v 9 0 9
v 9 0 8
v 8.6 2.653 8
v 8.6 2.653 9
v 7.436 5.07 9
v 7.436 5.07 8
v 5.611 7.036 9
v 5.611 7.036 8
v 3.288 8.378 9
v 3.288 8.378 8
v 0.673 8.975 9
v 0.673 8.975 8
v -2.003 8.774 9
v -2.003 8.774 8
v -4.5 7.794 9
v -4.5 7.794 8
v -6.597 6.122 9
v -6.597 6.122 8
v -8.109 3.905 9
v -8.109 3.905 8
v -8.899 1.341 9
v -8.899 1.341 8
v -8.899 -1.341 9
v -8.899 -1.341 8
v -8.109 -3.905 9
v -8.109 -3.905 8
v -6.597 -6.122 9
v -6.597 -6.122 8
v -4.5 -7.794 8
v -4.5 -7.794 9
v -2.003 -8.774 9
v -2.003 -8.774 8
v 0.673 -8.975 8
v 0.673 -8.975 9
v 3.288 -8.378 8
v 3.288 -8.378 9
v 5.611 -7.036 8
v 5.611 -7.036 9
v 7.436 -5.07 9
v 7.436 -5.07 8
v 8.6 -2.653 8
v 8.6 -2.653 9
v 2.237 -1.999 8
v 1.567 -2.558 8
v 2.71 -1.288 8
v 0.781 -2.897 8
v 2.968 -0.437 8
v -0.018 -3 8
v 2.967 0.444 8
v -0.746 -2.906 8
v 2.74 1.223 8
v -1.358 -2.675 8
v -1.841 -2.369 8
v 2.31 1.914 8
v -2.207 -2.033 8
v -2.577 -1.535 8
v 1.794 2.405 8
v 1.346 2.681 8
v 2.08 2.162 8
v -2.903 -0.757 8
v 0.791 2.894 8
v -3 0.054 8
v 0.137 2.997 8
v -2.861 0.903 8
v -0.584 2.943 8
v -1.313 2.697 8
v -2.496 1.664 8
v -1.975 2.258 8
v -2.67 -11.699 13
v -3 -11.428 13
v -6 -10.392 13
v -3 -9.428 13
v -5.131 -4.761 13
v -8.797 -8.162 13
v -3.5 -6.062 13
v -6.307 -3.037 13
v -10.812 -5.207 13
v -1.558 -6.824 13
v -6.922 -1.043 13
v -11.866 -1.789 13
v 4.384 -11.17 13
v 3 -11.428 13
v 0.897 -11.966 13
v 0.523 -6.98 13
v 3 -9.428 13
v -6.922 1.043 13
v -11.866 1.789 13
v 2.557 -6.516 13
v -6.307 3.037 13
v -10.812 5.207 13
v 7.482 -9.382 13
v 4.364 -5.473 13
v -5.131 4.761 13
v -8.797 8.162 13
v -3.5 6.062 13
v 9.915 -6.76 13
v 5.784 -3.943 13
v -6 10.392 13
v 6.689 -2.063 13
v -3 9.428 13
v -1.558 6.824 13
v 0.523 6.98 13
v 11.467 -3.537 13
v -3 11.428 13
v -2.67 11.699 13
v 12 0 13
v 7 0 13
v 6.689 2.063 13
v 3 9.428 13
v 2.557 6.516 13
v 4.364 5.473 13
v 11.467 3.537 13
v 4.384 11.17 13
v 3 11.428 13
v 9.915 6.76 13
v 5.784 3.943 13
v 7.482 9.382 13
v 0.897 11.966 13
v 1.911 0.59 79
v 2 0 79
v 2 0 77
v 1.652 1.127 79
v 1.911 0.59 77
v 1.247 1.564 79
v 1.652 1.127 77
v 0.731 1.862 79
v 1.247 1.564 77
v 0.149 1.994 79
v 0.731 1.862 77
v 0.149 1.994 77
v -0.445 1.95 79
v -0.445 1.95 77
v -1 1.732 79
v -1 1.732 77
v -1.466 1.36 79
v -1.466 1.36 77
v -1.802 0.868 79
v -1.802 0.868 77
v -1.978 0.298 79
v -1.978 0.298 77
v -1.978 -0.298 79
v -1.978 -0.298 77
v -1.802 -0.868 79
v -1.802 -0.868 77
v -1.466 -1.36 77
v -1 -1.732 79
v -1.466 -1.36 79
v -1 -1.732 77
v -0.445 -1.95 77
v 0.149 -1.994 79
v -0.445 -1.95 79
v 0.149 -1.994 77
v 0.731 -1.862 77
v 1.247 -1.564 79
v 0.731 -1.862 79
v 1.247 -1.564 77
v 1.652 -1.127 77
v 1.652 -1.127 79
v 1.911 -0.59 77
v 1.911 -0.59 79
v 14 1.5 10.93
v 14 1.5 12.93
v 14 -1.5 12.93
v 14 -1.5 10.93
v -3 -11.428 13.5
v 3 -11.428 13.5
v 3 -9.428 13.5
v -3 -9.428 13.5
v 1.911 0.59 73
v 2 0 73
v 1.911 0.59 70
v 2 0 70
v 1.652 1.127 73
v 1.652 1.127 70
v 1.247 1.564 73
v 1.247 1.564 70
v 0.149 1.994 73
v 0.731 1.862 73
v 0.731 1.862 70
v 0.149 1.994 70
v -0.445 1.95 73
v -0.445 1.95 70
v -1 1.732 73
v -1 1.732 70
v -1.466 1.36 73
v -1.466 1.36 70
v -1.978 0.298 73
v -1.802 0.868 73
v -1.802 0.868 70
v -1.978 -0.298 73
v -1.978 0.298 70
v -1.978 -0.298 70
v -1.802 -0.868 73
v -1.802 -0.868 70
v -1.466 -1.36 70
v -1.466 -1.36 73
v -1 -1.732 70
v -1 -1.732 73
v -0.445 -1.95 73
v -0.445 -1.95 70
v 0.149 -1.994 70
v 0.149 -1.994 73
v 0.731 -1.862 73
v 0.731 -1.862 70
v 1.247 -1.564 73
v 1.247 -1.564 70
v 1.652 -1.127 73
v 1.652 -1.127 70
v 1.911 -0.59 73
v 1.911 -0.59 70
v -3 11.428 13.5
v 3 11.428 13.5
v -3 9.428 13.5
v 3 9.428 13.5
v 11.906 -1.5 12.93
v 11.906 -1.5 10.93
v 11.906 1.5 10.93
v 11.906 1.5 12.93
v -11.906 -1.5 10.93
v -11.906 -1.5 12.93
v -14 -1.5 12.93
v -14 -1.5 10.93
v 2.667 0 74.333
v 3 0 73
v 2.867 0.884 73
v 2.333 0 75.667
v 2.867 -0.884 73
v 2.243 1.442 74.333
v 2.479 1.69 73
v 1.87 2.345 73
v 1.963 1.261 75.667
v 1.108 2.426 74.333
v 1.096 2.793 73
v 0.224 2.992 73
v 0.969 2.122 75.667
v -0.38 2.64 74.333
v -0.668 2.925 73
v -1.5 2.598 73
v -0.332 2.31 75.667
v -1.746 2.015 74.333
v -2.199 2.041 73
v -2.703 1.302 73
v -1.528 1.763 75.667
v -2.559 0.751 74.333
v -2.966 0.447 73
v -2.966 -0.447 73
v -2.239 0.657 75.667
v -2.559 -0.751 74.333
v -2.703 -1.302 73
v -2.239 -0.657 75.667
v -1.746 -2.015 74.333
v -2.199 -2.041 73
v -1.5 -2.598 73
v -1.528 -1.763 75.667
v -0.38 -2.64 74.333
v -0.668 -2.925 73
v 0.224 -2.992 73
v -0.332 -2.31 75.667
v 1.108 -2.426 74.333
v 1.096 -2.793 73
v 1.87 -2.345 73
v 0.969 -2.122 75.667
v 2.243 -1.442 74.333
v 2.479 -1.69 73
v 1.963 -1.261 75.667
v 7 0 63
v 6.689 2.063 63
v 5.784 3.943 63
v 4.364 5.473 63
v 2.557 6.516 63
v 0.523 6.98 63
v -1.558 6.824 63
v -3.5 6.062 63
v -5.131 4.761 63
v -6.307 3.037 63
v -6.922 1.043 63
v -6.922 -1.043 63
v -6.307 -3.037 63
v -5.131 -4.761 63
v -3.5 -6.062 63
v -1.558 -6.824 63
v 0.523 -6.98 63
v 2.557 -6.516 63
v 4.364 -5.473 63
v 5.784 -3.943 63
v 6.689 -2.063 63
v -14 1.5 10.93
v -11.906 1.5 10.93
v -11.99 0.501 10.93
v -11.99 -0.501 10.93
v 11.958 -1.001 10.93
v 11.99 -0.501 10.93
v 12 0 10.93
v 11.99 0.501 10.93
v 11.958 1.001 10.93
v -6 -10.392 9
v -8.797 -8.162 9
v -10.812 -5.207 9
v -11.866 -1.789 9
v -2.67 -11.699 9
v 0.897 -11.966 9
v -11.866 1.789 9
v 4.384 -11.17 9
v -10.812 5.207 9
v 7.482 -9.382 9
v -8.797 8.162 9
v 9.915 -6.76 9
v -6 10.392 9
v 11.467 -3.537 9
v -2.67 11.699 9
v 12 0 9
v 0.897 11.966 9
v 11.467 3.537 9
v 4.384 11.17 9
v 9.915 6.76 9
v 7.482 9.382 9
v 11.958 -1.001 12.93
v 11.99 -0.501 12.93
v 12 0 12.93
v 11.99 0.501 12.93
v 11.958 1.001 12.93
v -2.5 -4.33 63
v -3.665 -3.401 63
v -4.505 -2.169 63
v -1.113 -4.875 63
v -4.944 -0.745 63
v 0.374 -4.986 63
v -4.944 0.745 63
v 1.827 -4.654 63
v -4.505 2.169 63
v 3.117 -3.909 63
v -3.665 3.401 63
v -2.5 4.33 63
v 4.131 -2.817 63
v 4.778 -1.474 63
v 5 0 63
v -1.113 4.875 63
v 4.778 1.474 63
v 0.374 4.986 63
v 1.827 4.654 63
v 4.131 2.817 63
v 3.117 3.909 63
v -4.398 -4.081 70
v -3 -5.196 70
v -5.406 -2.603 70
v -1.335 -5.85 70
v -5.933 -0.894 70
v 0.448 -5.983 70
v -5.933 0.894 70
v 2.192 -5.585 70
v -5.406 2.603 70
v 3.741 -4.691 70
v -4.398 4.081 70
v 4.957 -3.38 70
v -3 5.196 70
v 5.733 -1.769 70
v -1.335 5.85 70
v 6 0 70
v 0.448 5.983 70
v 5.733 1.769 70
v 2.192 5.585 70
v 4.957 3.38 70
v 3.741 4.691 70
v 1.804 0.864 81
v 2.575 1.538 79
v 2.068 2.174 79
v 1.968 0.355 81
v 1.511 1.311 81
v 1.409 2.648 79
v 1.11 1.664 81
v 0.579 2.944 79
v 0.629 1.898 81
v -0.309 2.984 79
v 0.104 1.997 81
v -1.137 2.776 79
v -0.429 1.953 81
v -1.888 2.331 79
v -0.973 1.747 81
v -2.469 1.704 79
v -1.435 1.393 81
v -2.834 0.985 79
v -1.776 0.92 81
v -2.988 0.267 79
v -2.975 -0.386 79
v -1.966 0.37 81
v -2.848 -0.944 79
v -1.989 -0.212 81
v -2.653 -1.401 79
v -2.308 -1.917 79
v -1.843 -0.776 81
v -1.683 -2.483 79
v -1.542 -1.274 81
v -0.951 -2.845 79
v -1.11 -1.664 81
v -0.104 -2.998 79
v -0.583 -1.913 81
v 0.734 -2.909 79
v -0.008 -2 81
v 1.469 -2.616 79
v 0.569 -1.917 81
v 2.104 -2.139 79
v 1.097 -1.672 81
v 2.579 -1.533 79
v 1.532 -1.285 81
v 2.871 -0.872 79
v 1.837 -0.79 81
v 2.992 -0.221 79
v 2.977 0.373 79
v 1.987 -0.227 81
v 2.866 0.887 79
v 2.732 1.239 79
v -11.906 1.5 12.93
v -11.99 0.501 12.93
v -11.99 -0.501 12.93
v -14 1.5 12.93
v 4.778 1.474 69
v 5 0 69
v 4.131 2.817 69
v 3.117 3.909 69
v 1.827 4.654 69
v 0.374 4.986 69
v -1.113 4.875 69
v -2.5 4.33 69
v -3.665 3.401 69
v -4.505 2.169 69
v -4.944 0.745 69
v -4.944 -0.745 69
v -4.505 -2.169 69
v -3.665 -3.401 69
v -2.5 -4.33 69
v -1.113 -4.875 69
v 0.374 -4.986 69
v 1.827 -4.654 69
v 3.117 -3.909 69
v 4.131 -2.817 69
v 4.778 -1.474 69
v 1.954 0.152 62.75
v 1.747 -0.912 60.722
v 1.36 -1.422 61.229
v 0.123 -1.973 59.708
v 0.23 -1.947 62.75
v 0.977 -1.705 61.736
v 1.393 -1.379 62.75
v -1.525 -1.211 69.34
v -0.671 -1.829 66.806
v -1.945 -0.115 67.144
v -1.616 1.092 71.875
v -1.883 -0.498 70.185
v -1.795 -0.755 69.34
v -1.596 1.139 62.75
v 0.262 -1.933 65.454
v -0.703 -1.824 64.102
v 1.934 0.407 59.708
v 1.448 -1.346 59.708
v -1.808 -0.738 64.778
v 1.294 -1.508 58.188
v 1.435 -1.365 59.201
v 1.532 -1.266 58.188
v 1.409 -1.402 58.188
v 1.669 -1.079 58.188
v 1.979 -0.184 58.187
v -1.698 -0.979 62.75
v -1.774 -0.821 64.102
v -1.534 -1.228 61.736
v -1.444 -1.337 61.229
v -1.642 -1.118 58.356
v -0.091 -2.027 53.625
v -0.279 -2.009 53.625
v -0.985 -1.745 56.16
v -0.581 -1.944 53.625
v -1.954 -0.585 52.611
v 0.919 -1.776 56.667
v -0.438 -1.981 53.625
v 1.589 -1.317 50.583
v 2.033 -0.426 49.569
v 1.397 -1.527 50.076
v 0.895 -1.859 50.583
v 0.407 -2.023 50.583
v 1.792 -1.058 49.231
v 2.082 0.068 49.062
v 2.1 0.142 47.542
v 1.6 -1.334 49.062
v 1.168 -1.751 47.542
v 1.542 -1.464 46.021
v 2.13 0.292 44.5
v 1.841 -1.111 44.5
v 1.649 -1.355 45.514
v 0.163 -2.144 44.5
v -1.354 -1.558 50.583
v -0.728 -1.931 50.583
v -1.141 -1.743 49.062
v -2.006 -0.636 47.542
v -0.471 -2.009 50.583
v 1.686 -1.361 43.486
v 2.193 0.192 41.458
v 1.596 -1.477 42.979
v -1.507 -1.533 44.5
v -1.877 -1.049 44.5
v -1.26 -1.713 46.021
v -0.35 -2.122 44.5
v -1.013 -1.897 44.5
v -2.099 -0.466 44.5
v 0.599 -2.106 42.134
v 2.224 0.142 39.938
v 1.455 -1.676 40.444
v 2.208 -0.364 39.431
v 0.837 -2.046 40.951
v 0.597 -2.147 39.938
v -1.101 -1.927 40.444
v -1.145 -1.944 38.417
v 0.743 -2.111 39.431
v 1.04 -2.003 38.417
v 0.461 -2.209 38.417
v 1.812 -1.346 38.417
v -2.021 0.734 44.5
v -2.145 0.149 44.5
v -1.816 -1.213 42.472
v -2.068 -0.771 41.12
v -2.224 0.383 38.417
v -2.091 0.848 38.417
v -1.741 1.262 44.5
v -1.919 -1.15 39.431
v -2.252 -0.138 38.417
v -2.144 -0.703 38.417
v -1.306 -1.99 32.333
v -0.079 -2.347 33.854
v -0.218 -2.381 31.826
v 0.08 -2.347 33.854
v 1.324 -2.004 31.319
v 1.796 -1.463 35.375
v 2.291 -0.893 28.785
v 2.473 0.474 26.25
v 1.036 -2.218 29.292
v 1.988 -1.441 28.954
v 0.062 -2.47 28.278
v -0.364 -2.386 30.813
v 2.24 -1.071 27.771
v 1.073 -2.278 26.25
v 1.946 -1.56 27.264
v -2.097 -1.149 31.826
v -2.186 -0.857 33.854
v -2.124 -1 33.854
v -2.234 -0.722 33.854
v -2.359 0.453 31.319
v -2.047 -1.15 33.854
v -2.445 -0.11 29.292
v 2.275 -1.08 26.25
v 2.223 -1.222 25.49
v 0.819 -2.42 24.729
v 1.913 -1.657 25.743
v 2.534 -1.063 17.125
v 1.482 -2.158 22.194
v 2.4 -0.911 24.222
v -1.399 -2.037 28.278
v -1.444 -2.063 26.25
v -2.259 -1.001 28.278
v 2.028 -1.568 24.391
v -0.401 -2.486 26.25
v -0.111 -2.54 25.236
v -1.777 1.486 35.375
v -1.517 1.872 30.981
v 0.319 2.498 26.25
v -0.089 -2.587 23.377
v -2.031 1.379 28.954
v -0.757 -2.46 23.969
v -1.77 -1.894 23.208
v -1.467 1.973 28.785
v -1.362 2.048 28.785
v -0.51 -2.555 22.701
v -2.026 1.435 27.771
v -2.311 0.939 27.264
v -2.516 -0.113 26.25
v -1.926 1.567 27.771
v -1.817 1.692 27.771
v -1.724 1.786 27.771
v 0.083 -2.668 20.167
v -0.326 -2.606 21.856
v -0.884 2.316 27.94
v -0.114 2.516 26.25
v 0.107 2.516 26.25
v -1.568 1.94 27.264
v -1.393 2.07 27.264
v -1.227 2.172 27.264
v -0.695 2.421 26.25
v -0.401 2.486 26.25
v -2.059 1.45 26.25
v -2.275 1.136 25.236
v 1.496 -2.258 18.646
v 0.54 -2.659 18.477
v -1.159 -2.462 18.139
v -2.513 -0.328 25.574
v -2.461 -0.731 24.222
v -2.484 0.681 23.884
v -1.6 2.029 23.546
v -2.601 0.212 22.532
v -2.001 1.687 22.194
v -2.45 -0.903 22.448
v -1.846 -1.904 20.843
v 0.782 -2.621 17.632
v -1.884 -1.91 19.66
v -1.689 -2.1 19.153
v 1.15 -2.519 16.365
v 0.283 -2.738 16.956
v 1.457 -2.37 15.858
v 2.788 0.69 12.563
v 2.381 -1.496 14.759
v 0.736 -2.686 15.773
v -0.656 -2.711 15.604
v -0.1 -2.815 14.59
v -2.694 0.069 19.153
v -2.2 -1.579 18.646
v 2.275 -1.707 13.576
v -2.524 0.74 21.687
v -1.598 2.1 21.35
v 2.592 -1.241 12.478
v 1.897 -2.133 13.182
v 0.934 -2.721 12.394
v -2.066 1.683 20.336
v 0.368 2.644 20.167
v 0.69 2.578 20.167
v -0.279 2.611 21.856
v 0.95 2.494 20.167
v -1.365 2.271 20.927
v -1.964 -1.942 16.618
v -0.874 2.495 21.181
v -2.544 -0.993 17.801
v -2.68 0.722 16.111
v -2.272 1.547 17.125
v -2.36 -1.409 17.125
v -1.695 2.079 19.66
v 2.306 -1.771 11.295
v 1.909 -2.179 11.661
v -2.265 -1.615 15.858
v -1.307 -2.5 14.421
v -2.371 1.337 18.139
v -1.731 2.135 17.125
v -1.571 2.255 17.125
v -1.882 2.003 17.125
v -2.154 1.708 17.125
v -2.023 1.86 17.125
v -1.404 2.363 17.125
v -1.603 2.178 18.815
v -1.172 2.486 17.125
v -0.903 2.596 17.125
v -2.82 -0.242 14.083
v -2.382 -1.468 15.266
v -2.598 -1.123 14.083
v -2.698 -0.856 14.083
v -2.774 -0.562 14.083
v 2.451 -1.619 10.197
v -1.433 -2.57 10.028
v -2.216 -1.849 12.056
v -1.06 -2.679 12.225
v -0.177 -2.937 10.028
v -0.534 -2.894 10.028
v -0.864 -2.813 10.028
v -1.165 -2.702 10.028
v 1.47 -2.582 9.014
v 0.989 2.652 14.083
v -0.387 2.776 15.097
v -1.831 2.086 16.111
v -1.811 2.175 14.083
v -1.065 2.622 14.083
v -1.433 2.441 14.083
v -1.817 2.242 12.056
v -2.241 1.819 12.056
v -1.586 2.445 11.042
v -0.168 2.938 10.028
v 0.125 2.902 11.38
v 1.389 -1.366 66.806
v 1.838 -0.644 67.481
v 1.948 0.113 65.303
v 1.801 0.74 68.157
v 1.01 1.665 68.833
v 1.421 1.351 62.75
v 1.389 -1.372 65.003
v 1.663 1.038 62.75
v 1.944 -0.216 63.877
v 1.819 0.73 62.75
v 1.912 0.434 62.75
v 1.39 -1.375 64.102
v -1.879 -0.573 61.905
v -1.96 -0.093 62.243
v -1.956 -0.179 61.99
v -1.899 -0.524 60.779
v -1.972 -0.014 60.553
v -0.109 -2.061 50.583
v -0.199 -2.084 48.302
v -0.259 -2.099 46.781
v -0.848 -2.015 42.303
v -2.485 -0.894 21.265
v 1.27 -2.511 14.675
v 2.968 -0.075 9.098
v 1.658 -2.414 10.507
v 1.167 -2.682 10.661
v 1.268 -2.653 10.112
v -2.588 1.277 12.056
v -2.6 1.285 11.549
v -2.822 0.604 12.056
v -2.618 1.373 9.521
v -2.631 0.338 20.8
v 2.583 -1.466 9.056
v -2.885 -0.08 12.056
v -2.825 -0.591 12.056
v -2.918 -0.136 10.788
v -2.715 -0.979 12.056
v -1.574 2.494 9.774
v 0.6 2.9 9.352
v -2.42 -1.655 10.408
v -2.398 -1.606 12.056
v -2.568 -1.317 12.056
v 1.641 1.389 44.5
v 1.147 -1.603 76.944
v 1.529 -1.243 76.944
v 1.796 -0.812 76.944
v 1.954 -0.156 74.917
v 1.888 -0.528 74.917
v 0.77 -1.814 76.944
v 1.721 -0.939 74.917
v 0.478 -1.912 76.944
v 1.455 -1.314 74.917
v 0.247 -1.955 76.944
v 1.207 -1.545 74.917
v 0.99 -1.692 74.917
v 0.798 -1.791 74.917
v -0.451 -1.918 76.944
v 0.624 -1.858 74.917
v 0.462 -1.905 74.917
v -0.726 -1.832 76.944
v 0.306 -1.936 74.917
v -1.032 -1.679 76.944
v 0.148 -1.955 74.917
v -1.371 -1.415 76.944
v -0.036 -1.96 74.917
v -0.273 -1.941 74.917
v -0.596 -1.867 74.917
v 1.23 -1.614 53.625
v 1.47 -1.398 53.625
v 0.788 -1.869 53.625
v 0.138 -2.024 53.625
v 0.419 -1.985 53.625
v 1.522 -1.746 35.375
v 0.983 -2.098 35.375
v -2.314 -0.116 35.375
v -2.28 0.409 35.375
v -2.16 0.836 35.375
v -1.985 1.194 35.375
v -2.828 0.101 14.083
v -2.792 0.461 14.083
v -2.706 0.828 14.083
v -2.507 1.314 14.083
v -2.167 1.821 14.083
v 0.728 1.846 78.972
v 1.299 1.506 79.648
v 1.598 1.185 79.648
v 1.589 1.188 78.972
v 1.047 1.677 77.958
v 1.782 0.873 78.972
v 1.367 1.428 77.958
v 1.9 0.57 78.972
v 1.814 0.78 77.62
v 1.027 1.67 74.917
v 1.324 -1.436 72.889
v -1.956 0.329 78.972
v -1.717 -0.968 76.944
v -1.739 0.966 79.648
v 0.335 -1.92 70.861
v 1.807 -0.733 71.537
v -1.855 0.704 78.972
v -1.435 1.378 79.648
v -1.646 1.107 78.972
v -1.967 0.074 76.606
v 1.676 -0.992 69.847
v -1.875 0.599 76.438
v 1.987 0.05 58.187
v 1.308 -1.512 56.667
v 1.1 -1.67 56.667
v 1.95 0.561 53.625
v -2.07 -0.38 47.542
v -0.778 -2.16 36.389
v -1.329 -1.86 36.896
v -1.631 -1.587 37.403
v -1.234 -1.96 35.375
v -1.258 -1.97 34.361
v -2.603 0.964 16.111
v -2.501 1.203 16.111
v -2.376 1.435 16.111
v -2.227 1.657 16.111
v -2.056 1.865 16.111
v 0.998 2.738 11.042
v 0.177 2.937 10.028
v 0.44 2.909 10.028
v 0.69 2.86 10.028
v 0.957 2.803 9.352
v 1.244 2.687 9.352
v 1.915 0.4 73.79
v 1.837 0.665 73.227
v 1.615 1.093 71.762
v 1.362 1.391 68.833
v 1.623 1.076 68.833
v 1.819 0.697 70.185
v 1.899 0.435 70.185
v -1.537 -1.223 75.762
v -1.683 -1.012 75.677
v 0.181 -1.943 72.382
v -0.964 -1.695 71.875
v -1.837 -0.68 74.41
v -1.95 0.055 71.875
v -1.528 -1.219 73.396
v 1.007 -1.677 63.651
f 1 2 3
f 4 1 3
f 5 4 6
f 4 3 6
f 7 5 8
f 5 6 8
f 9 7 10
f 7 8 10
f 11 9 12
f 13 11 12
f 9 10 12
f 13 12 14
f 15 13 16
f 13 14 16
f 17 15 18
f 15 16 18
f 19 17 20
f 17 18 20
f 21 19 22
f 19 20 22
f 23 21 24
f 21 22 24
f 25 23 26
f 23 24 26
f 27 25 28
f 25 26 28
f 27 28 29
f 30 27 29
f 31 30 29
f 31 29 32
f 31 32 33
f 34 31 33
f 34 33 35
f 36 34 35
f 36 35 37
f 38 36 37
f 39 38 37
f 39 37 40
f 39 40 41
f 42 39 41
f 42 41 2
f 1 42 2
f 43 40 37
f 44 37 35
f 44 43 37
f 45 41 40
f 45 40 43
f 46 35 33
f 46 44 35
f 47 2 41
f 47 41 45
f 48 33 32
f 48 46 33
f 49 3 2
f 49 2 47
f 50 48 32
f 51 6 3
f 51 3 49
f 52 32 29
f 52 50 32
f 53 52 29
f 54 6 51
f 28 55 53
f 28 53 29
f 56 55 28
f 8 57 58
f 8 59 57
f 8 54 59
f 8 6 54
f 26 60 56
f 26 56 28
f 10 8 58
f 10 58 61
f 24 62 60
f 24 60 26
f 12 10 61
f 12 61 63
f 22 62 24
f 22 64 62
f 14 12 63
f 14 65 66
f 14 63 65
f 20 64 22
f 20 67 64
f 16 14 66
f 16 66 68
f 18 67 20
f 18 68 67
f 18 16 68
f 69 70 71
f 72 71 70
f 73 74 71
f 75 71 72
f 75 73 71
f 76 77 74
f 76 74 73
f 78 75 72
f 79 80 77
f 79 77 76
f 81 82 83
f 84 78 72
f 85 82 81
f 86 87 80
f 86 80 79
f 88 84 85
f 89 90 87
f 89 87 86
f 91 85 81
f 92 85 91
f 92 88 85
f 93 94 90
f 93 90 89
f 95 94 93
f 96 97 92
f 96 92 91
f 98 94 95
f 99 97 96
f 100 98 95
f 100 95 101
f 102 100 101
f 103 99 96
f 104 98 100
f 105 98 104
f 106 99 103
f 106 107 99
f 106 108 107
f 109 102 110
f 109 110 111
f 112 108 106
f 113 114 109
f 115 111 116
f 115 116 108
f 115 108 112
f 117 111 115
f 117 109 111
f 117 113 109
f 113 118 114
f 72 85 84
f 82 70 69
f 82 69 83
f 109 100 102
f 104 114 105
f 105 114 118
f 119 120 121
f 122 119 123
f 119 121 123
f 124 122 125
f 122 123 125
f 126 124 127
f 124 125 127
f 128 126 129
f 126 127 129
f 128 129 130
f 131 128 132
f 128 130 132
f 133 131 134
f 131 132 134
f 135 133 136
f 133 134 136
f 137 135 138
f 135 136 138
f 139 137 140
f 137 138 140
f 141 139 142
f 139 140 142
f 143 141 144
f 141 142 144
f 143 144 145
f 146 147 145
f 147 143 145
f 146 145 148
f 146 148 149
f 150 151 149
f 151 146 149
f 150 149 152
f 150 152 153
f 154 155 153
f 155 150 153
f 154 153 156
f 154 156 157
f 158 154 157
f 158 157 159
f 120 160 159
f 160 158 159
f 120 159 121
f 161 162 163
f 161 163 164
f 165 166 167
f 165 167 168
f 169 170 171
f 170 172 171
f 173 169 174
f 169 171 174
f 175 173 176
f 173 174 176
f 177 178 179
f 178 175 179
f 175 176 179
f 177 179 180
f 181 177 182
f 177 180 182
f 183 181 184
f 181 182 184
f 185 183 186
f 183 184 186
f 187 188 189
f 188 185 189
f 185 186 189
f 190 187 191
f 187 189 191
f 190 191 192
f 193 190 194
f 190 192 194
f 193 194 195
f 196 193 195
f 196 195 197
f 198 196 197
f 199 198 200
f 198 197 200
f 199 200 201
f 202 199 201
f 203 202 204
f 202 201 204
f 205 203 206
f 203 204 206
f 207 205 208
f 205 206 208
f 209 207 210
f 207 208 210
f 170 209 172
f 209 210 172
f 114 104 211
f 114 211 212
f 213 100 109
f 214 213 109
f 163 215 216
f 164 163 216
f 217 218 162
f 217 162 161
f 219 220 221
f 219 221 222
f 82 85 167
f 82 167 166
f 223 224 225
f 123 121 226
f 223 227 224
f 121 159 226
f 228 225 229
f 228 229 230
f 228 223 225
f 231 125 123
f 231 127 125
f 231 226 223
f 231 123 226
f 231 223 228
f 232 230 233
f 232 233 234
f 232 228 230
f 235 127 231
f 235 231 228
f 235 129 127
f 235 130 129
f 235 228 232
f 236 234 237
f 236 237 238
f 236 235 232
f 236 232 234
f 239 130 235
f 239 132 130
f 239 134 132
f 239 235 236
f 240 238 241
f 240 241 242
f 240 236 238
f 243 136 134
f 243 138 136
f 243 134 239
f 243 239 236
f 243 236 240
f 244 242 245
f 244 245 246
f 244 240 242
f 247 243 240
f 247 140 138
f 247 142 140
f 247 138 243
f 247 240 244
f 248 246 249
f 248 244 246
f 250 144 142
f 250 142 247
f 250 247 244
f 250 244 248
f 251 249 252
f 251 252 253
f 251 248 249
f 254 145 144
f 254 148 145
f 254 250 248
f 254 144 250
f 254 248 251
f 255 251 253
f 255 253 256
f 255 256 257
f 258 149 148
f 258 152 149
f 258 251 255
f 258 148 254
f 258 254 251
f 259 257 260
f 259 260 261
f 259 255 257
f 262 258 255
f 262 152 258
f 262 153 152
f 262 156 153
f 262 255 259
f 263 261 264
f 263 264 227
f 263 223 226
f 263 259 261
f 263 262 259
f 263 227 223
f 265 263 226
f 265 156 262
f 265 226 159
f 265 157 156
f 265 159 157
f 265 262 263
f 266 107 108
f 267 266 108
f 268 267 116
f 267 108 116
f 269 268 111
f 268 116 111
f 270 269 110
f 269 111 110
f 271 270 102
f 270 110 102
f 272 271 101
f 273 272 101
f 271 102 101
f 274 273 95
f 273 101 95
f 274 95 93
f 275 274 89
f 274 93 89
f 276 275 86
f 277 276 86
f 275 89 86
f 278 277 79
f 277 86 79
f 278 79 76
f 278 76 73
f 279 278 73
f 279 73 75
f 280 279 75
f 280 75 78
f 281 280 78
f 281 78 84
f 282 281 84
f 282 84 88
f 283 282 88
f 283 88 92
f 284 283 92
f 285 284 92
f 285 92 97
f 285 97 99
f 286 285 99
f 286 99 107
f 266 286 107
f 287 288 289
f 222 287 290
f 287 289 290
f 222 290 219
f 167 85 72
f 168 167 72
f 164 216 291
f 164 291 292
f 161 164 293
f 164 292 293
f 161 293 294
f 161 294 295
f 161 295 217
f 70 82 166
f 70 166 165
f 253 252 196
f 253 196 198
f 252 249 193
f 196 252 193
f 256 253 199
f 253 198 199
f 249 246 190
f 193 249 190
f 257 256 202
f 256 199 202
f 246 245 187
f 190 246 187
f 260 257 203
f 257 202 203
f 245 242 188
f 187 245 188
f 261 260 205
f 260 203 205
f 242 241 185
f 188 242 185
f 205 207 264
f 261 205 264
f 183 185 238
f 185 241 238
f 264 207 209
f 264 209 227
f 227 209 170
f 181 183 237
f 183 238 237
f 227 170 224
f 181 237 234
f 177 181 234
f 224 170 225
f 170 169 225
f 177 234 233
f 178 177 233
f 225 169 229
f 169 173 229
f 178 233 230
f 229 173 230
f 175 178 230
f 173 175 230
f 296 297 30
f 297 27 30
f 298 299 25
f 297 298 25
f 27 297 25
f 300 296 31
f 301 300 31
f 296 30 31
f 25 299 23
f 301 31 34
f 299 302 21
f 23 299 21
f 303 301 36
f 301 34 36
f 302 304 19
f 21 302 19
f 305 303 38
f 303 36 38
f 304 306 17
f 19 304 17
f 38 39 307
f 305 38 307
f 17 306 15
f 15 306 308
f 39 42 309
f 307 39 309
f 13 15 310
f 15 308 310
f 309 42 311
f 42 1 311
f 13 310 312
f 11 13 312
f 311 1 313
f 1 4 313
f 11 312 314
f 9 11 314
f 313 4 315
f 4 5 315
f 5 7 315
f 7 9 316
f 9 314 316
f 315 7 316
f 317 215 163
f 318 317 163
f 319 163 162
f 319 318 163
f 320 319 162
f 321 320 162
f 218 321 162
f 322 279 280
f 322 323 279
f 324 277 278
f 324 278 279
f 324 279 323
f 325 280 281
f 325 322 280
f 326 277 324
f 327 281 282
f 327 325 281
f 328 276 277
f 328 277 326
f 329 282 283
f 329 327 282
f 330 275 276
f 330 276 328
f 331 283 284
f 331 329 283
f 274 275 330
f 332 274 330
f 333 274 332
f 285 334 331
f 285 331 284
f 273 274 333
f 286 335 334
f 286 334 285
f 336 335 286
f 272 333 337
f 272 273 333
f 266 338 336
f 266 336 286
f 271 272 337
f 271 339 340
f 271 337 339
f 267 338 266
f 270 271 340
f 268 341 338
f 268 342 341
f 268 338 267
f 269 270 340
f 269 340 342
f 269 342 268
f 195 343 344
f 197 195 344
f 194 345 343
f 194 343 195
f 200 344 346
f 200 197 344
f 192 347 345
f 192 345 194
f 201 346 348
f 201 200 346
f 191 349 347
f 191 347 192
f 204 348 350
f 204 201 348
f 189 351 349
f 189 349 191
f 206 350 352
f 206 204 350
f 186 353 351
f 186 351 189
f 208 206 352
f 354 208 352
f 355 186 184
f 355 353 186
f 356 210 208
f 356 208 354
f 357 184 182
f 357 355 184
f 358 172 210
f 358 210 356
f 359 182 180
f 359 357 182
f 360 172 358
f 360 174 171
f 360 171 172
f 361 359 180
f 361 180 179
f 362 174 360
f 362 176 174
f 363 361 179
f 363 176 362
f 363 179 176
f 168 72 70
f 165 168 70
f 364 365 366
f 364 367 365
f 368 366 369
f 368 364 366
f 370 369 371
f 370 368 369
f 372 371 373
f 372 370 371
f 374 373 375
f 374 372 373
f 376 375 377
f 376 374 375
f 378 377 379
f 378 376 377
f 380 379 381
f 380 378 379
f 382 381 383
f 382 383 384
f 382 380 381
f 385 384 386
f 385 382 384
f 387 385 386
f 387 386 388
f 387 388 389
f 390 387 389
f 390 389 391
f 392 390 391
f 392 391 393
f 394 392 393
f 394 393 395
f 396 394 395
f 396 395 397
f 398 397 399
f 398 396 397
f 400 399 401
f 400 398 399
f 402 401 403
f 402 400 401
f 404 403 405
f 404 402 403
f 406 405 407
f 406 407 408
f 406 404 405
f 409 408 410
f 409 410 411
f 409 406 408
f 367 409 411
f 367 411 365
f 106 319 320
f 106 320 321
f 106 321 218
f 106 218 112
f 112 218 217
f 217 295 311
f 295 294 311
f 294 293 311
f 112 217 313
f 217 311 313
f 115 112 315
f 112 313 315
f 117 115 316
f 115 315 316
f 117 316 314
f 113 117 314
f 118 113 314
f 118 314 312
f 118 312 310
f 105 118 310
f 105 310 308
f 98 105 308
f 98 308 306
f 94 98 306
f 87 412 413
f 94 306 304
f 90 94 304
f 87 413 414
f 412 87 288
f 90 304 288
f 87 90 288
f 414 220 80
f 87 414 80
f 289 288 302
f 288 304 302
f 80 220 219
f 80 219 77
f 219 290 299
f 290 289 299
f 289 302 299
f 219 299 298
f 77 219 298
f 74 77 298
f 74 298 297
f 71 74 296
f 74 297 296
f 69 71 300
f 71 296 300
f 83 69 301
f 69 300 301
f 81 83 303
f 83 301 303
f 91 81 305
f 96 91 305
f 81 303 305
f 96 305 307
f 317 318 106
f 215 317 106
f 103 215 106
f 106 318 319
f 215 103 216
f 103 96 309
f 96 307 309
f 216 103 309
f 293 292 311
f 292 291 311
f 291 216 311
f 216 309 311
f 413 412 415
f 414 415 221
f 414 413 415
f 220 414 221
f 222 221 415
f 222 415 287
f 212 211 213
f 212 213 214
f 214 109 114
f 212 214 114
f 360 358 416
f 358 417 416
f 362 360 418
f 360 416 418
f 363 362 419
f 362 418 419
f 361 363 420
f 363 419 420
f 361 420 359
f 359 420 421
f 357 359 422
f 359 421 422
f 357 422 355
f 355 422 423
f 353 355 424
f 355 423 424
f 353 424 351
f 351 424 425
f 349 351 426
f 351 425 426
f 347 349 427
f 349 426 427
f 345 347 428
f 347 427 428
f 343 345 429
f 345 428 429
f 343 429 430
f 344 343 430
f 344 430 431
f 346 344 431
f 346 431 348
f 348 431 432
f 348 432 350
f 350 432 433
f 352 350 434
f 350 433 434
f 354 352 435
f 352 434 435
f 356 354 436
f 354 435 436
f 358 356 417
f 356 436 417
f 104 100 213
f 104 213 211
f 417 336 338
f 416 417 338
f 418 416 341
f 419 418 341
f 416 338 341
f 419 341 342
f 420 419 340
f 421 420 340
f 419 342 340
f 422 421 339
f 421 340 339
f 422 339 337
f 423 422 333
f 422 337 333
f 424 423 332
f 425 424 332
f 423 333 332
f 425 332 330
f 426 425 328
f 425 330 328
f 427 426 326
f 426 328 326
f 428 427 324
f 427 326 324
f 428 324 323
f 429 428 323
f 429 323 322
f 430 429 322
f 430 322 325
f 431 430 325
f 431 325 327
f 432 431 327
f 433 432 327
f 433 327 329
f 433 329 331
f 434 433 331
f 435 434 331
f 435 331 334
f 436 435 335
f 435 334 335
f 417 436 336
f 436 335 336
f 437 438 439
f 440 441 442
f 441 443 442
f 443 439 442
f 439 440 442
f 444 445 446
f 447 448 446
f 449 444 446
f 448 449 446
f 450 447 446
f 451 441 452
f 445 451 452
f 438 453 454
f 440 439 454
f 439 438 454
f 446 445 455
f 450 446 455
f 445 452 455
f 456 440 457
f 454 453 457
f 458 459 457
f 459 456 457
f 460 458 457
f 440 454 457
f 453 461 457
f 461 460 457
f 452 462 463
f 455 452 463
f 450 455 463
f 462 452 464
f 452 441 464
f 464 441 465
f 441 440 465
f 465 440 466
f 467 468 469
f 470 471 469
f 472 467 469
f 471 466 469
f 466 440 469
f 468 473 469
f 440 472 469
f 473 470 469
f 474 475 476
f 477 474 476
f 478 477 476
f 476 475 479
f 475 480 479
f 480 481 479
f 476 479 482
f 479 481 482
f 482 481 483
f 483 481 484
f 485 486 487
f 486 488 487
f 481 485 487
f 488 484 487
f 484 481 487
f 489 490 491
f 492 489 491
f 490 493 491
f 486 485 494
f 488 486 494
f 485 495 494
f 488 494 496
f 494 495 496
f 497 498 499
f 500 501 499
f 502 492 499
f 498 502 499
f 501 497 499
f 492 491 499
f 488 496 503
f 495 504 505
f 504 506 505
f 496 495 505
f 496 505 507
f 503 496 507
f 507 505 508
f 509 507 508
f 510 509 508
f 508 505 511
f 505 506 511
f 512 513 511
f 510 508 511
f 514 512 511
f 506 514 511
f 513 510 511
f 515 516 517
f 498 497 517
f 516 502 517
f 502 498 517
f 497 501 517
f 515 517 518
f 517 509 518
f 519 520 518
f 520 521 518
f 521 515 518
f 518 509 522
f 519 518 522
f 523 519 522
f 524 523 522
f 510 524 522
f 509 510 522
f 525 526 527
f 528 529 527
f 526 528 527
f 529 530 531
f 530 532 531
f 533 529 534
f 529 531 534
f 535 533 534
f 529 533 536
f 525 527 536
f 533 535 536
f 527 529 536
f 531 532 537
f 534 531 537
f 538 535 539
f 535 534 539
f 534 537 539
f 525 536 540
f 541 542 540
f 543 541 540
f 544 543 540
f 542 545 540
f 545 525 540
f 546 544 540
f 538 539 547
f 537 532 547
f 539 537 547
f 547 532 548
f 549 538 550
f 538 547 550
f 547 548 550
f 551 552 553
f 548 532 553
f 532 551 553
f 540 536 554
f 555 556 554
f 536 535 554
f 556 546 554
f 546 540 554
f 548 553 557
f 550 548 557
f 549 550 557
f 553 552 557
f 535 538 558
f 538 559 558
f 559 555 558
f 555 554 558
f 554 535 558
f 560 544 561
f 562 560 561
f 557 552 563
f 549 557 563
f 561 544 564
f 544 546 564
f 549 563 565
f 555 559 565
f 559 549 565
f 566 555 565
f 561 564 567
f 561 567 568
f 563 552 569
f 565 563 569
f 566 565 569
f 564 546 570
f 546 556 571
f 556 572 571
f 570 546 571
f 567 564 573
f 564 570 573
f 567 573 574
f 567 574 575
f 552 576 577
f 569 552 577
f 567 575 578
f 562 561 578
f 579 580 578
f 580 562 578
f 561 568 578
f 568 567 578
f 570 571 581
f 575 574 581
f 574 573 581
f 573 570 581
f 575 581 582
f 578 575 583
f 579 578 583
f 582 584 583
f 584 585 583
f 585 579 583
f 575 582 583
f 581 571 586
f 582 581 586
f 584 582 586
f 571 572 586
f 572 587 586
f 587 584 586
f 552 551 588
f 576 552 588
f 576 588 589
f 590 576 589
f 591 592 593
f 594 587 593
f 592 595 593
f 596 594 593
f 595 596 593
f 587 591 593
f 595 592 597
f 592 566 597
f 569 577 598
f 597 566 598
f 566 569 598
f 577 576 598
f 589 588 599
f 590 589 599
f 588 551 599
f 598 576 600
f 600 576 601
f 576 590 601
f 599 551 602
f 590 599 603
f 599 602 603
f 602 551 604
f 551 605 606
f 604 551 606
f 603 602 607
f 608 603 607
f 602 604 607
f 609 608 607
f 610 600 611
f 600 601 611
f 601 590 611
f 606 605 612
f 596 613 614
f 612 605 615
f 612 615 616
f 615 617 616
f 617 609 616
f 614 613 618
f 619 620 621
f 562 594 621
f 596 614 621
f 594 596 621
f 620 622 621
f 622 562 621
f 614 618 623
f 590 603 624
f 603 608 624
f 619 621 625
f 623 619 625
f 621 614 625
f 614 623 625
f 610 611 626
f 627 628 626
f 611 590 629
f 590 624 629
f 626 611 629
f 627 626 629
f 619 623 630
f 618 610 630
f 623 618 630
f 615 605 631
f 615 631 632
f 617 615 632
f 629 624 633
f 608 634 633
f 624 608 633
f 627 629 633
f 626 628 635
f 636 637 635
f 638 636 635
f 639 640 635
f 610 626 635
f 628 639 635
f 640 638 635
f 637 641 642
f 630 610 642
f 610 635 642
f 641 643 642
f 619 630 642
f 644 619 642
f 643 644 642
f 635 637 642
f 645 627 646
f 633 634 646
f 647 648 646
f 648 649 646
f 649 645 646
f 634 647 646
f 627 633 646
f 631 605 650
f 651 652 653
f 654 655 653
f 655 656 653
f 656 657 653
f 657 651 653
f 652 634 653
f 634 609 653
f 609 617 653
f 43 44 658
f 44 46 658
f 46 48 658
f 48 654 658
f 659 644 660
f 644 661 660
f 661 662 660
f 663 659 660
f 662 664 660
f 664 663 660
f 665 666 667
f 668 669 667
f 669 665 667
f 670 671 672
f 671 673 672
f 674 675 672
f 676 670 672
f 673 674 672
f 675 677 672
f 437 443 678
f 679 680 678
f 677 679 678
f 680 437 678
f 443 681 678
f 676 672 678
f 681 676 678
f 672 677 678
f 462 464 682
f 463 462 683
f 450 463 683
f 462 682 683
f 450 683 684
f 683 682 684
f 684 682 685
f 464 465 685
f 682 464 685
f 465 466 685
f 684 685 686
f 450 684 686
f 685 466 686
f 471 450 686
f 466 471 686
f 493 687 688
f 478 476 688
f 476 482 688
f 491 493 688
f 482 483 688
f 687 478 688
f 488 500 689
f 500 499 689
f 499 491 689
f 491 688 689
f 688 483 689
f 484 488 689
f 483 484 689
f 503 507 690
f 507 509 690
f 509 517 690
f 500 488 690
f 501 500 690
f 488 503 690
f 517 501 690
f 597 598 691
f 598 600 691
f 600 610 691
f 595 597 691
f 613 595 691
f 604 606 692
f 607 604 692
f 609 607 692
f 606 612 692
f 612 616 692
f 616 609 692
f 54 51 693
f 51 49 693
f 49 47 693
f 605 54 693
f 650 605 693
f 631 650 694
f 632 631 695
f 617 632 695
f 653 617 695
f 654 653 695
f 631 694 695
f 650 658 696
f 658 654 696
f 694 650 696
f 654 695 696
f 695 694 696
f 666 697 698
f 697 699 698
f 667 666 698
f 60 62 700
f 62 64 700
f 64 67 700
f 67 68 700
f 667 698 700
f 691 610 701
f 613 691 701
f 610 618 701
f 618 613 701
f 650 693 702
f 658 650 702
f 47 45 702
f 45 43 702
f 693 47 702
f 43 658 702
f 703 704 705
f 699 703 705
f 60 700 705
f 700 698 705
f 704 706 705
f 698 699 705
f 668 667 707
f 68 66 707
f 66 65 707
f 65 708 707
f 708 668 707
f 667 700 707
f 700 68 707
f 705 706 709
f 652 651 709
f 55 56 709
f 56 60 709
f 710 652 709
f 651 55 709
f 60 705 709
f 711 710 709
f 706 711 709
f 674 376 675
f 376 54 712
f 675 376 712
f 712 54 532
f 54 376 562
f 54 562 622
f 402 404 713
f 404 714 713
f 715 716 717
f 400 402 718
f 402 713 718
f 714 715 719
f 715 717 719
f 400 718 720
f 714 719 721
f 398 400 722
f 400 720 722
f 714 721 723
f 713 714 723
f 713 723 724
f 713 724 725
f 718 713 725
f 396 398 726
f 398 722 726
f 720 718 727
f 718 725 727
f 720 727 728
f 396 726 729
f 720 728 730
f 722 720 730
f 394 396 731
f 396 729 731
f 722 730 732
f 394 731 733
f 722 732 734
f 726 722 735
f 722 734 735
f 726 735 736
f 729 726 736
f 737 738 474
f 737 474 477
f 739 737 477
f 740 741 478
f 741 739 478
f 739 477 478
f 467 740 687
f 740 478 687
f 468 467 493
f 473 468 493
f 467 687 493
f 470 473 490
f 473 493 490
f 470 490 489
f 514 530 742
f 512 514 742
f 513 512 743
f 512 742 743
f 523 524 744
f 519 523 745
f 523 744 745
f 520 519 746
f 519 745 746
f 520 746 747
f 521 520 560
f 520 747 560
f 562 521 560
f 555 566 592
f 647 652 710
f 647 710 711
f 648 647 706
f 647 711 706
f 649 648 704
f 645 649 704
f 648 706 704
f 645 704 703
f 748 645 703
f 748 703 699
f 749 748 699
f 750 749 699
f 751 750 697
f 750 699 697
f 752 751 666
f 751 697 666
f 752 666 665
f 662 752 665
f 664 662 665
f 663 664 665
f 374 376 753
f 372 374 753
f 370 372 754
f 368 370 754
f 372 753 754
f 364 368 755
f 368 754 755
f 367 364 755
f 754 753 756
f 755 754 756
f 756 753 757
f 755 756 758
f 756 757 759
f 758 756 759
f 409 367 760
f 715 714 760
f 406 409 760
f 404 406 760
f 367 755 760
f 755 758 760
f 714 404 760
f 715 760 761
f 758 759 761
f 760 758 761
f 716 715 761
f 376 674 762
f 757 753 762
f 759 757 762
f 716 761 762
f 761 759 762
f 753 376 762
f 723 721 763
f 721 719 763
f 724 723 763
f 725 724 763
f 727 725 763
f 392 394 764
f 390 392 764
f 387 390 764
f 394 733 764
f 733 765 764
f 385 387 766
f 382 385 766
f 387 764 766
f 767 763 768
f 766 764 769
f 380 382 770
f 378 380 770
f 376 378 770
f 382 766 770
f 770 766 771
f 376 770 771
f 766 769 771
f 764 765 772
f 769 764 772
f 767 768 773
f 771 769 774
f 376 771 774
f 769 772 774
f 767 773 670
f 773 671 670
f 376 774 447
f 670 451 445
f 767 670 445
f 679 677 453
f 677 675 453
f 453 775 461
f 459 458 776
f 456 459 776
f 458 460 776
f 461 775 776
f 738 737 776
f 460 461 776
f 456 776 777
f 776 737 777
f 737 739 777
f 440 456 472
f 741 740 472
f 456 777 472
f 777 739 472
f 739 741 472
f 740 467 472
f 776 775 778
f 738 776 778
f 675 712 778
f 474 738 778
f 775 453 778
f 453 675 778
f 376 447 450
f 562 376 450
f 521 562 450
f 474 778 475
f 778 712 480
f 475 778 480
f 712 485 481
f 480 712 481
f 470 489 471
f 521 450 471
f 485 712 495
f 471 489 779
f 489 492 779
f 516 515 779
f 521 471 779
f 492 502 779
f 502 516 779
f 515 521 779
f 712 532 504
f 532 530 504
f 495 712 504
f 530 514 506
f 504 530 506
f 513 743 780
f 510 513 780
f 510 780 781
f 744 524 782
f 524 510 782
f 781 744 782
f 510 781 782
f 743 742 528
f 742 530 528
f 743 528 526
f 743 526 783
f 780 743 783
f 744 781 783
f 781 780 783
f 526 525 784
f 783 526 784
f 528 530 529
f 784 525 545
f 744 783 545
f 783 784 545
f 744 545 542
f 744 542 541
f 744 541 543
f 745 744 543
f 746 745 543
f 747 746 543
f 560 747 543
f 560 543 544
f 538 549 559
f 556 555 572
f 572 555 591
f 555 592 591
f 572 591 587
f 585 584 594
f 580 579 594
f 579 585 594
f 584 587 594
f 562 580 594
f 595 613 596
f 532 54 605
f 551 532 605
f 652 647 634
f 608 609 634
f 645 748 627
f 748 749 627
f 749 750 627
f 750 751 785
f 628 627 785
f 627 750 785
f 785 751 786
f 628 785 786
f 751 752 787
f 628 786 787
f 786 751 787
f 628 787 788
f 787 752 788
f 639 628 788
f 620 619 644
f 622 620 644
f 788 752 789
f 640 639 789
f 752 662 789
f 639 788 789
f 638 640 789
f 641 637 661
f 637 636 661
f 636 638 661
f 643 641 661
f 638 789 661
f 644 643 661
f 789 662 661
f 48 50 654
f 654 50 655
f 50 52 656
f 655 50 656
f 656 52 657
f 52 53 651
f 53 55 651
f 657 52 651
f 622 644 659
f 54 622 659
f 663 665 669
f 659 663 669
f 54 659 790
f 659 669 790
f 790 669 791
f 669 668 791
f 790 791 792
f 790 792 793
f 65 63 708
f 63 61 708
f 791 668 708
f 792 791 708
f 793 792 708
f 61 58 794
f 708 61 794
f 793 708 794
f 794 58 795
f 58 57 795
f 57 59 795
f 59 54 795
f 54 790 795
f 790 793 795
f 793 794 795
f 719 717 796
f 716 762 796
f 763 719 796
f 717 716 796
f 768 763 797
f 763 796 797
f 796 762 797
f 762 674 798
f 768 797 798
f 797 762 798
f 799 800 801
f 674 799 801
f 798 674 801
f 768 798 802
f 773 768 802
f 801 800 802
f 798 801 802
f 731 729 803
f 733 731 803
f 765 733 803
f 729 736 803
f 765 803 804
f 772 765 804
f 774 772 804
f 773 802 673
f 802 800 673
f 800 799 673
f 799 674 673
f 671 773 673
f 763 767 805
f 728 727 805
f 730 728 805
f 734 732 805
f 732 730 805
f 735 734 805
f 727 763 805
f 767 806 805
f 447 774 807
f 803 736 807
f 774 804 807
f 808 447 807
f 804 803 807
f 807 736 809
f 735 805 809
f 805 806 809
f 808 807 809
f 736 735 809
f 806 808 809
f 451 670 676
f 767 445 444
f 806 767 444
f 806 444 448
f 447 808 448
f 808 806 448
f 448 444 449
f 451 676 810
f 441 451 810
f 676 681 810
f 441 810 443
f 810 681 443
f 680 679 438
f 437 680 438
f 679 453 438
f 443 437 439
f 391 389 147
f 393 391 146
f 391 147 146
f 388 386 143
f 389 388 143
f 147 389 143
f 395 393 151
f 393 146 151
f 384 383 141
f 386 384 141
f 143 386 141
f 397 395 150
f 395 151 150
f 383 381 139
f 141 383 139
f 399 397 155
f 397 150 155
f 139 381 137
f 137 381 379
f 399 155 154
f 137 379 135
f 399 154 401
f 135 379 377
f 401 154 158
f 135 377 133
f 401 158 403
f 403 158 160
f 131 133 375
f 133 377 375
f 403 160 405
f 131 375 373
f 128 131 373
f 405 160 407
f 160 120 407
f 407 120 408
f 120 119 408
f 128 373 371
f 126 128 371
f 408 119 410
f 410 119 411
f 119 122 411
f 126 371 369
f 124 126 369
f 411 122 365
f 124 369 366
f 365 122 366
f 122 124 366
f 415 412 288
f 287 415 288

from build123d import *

# Parameters (mm, degrees)
SKETCH1_R           = 9
BOSS_EXTRUDE1_DEPTH = 9
SKETCH2_R           = 7
BOSS_EXTRUDE2_DEPTH = 54
SKETCH3_R           = 12
BOSS_EXTRUDE3_DEPTH = 4
SKETCH4_R           = 5
BOSS_EXTRUDE4_DEPTH = 6
SKETCH5_R           = 2
BOSS_EXTRUDE5_DEPTH = 12
SKETCH6_R           = 6
SKETCH9_R           = 3
SKETCH8_R           = 2
SKETCH10_W          = 6
SKETCH10_H          = 2
BOSS_EXTRUDE6_DEPTH = 0.5
SKETCH11_W          = 2
SKETCH11_H          = 3
BOSS_EXTRUDE7_DEPTH = 3
CIRPATTERN2_COUNT   = 2
SKETCH12_R          = 9
CUT_EXTRUDE1_DEPTH  = 8


with BuildPart() as part:
    # Sketch1 → Boss-Extrude1 (new body)
    with BuildSketch(Plane.XY):
        Circle(SKETCH1_R)
    extrude(amount=BOSS_EXTRUDE1_DEPTH)

    # Sketch2 → Boss-Extrude2 (add)
    with BuildSketch(Plane.XY.offset(9)):
        Circle(SKETCH2_R)
    extrude(amount=BOSS_EXTRUDE2_DEPTH)

    # Sketch3 → Boss-Extrude3 (add)
    with BuildSketch(Plane.XY.offset(9)):
        Circle(SKETCH3_R)
    extrude(amount=BOSS_EXTRUDE3_DEPTH)

    # Sketch4 → Boss-Extrude4 (add)
    with BuildSketch(Plane.XY.offset(63)):
        Circle(SKETCH4_R)
    extrude(amount=BOSS_EXTRUDE4_DEPTH)

    # Sketch5 → Boss-Extrude5 (add)
    with BuildSketch(Plane.XY.offset(69)):
        Circle(SKETCH5_R)
    extrude(amount=BOSS_EXTRUDE5_DEPTH)

    # Sketch6 → section 0 of loft1
    with BuildSketch(Plane.XY.offset(70), mode=Mode.PRIVATE) as loft1_s0:
        Circle(SKETCH6_R)
    # loft up to a face of the part (loft1)
    loft([loft1_s0.sketch, Face(Wire([part.edges().sort_by_distance((-3.42273553, 3.644843137, 69))[0]]))])

    # Loft2: read off the stored shape, not the designer's step
    # Loft2: loft between two sections, ruled curve by curve
    loft2_from = [
        Edge.make_bspline([(2.575484484, 1.538466663, 79), (-0.501448843, 6.689435631, 79), (-5.652417811, 3.612502304, 79), (-2.575484484, -1.538466663, 79), (0.501448843, -6.689435631, 79), (5.652417811, -3.612502304, 79), (2.575484484, 1.538466663, 79)], [0, 0, 0, 0, 0.5, 0.5, 0.5, 1, 1, 1, 1], 3, [1, 0.333333333, 0.333333333, 1, 0.333333333, 0.333333333, 1]),
    ]
    loft2_to = [
        Edge.make_bspline([(1.968242689, 0.354993967, 81), (1.258254754, 4.291479346, 81), (-2.678230624, 3.581491411, 81), (-1.968242689, -0.354993967, 81), (-1.258254754, -4.291479346, 81), (2.678230624, -3.581491411, 81), (1.968242689, 0.354993967, 81)], [0, 0, 0, 0, 0.5, 0.5, 0.5, 1, 1, 1, 1], 3, [1, 0.333333333, 0.333333333, 1, 0.333333333, 0.333333333, 1]),
    ]
    loft2 = Solid(Shell([*[Face.make_surface_from_curves(loft2_from[k], loft2_to[k]) for k in range(1)], Face(Wire(loft2_from)), Face(Wire(loft2_to))]))
    add(loft2)

    # Sketch9 → Loft3 section 0
    with BuildSketch(Plane.XY.offset(73)):
        Circle(SKETCH9_R)
    # Sketch8 → Loft3 section 1
    with BuildSketch(Plane.XY.offset(77)):
        Circle(SKETCH8_R)
    loft()

    # Sketch10 → Boss-Extrude6 (add)
    with BuildSketch(Plane.XY.offset(13)):
        with Locations((0, 10.428217705)):
            Rectangle(SKETCH10_W, SKETCH10_H)
    boss_extrude6 = extrude(amount=BOSS_EXTRUDE6_DEPTH)

    # Sketch11 → Boss-Extrude7 (add)
    with BuildSketch(Plane(origin=(11, 0, 0), x_dir=(0, 0, -1), z_dir=(1, 0, 0))):
        with Locations((-11.929859907, 0)):
            Rectangle(SKETCH11_W, SKETCH11_H)
    boss_extrude7 = extrude(amount=BOSS_EXTRUDE7_DEPTH)

    # CirPattern2: Boss-Extrude6, Boss-Extrude7 ×2 about axis
    cirpattern2_axis = Axis((0, 0, 0), (0, 0, 1))
    add([boss_extrude6.rotate(cirpattern2_axis, i * 360 / CIRPATTERN2_COUNT) for i in range(1, CIRPATTERN2_COUNT)])
    add([boss_extrude7.rotate(cirpattern2_axis, i * 360 / CIRPATTERN2_COUNT) for i in range(1, CIRPATTERN2_COUNT)])

    # Sketch12 → Cut-Extrude1 (cut)
    with BuildSketch(Plane(origin=(0, 0, 0), x_dir=(-1, 0, 0), z_dir=(0, 0, -1))):
        Circle(SKETCH12_R)
    extrude(amount=-CUT_EXTRUDE1_DEPTH, mode=Mode.SUBTRACT)

    # Cut-Loft1: read off the stored shape, not the designer's step
    # Cut-Loft1: loft between two sections, ruled curve by curve
    cut_loft1_from = [
        Edge.make_bspline([(-0.428925161, 1.953464411, 81), (3.478003662, 2.811314733, 81), (4.335853984, -1.09561409, 81), (0.428925161, -1.953464411, 81), (-3.478003662, -2.811314733, 81), (-4.335853984, 1.09561409, 81), (-0.428925161, 1.953464411, 81)], [0, 0, 0, 0, 0.5, 0.5, 0.5, 1, 1, 1, 1], 3, [1, 0.333333333, 0.333333333, 1, 0.333333333, 0.333333333, 1]),
    ]
    cut_loft1_to = [
        Edge.make_bspline([(2.310337756, 1.913723975, 8), (6.137785706, -2.706951537, 8), (1.517110194, -6.534399487, 8), (-2.310337756, -1.913723975, 8), (-6.137785706, 2.706951537, 8), (-1.517110194, 6.534399487, 8), (2.310337756, 1.913723975, 8)], [0, 0, 0, 0, 0.5, 0.5, 0.5, 1, 1, 1, 1], 3, [1, 0.333333333, 0.333333333, 1, 0.333333333, 0.333333333, 1]),
    ]
    cut_loft1 = Solid(Shell([*[Face.make_surface_from_curves(cut_loft1_from[k], cut_loft1_to[k]) for k in range(1)], Face(Wire(cut_loft1_from)), Face(Wire(cut_loft1_to))]))
    add(cut_loft1, mode=Mode.SUBTRACT)


solid = part.part
